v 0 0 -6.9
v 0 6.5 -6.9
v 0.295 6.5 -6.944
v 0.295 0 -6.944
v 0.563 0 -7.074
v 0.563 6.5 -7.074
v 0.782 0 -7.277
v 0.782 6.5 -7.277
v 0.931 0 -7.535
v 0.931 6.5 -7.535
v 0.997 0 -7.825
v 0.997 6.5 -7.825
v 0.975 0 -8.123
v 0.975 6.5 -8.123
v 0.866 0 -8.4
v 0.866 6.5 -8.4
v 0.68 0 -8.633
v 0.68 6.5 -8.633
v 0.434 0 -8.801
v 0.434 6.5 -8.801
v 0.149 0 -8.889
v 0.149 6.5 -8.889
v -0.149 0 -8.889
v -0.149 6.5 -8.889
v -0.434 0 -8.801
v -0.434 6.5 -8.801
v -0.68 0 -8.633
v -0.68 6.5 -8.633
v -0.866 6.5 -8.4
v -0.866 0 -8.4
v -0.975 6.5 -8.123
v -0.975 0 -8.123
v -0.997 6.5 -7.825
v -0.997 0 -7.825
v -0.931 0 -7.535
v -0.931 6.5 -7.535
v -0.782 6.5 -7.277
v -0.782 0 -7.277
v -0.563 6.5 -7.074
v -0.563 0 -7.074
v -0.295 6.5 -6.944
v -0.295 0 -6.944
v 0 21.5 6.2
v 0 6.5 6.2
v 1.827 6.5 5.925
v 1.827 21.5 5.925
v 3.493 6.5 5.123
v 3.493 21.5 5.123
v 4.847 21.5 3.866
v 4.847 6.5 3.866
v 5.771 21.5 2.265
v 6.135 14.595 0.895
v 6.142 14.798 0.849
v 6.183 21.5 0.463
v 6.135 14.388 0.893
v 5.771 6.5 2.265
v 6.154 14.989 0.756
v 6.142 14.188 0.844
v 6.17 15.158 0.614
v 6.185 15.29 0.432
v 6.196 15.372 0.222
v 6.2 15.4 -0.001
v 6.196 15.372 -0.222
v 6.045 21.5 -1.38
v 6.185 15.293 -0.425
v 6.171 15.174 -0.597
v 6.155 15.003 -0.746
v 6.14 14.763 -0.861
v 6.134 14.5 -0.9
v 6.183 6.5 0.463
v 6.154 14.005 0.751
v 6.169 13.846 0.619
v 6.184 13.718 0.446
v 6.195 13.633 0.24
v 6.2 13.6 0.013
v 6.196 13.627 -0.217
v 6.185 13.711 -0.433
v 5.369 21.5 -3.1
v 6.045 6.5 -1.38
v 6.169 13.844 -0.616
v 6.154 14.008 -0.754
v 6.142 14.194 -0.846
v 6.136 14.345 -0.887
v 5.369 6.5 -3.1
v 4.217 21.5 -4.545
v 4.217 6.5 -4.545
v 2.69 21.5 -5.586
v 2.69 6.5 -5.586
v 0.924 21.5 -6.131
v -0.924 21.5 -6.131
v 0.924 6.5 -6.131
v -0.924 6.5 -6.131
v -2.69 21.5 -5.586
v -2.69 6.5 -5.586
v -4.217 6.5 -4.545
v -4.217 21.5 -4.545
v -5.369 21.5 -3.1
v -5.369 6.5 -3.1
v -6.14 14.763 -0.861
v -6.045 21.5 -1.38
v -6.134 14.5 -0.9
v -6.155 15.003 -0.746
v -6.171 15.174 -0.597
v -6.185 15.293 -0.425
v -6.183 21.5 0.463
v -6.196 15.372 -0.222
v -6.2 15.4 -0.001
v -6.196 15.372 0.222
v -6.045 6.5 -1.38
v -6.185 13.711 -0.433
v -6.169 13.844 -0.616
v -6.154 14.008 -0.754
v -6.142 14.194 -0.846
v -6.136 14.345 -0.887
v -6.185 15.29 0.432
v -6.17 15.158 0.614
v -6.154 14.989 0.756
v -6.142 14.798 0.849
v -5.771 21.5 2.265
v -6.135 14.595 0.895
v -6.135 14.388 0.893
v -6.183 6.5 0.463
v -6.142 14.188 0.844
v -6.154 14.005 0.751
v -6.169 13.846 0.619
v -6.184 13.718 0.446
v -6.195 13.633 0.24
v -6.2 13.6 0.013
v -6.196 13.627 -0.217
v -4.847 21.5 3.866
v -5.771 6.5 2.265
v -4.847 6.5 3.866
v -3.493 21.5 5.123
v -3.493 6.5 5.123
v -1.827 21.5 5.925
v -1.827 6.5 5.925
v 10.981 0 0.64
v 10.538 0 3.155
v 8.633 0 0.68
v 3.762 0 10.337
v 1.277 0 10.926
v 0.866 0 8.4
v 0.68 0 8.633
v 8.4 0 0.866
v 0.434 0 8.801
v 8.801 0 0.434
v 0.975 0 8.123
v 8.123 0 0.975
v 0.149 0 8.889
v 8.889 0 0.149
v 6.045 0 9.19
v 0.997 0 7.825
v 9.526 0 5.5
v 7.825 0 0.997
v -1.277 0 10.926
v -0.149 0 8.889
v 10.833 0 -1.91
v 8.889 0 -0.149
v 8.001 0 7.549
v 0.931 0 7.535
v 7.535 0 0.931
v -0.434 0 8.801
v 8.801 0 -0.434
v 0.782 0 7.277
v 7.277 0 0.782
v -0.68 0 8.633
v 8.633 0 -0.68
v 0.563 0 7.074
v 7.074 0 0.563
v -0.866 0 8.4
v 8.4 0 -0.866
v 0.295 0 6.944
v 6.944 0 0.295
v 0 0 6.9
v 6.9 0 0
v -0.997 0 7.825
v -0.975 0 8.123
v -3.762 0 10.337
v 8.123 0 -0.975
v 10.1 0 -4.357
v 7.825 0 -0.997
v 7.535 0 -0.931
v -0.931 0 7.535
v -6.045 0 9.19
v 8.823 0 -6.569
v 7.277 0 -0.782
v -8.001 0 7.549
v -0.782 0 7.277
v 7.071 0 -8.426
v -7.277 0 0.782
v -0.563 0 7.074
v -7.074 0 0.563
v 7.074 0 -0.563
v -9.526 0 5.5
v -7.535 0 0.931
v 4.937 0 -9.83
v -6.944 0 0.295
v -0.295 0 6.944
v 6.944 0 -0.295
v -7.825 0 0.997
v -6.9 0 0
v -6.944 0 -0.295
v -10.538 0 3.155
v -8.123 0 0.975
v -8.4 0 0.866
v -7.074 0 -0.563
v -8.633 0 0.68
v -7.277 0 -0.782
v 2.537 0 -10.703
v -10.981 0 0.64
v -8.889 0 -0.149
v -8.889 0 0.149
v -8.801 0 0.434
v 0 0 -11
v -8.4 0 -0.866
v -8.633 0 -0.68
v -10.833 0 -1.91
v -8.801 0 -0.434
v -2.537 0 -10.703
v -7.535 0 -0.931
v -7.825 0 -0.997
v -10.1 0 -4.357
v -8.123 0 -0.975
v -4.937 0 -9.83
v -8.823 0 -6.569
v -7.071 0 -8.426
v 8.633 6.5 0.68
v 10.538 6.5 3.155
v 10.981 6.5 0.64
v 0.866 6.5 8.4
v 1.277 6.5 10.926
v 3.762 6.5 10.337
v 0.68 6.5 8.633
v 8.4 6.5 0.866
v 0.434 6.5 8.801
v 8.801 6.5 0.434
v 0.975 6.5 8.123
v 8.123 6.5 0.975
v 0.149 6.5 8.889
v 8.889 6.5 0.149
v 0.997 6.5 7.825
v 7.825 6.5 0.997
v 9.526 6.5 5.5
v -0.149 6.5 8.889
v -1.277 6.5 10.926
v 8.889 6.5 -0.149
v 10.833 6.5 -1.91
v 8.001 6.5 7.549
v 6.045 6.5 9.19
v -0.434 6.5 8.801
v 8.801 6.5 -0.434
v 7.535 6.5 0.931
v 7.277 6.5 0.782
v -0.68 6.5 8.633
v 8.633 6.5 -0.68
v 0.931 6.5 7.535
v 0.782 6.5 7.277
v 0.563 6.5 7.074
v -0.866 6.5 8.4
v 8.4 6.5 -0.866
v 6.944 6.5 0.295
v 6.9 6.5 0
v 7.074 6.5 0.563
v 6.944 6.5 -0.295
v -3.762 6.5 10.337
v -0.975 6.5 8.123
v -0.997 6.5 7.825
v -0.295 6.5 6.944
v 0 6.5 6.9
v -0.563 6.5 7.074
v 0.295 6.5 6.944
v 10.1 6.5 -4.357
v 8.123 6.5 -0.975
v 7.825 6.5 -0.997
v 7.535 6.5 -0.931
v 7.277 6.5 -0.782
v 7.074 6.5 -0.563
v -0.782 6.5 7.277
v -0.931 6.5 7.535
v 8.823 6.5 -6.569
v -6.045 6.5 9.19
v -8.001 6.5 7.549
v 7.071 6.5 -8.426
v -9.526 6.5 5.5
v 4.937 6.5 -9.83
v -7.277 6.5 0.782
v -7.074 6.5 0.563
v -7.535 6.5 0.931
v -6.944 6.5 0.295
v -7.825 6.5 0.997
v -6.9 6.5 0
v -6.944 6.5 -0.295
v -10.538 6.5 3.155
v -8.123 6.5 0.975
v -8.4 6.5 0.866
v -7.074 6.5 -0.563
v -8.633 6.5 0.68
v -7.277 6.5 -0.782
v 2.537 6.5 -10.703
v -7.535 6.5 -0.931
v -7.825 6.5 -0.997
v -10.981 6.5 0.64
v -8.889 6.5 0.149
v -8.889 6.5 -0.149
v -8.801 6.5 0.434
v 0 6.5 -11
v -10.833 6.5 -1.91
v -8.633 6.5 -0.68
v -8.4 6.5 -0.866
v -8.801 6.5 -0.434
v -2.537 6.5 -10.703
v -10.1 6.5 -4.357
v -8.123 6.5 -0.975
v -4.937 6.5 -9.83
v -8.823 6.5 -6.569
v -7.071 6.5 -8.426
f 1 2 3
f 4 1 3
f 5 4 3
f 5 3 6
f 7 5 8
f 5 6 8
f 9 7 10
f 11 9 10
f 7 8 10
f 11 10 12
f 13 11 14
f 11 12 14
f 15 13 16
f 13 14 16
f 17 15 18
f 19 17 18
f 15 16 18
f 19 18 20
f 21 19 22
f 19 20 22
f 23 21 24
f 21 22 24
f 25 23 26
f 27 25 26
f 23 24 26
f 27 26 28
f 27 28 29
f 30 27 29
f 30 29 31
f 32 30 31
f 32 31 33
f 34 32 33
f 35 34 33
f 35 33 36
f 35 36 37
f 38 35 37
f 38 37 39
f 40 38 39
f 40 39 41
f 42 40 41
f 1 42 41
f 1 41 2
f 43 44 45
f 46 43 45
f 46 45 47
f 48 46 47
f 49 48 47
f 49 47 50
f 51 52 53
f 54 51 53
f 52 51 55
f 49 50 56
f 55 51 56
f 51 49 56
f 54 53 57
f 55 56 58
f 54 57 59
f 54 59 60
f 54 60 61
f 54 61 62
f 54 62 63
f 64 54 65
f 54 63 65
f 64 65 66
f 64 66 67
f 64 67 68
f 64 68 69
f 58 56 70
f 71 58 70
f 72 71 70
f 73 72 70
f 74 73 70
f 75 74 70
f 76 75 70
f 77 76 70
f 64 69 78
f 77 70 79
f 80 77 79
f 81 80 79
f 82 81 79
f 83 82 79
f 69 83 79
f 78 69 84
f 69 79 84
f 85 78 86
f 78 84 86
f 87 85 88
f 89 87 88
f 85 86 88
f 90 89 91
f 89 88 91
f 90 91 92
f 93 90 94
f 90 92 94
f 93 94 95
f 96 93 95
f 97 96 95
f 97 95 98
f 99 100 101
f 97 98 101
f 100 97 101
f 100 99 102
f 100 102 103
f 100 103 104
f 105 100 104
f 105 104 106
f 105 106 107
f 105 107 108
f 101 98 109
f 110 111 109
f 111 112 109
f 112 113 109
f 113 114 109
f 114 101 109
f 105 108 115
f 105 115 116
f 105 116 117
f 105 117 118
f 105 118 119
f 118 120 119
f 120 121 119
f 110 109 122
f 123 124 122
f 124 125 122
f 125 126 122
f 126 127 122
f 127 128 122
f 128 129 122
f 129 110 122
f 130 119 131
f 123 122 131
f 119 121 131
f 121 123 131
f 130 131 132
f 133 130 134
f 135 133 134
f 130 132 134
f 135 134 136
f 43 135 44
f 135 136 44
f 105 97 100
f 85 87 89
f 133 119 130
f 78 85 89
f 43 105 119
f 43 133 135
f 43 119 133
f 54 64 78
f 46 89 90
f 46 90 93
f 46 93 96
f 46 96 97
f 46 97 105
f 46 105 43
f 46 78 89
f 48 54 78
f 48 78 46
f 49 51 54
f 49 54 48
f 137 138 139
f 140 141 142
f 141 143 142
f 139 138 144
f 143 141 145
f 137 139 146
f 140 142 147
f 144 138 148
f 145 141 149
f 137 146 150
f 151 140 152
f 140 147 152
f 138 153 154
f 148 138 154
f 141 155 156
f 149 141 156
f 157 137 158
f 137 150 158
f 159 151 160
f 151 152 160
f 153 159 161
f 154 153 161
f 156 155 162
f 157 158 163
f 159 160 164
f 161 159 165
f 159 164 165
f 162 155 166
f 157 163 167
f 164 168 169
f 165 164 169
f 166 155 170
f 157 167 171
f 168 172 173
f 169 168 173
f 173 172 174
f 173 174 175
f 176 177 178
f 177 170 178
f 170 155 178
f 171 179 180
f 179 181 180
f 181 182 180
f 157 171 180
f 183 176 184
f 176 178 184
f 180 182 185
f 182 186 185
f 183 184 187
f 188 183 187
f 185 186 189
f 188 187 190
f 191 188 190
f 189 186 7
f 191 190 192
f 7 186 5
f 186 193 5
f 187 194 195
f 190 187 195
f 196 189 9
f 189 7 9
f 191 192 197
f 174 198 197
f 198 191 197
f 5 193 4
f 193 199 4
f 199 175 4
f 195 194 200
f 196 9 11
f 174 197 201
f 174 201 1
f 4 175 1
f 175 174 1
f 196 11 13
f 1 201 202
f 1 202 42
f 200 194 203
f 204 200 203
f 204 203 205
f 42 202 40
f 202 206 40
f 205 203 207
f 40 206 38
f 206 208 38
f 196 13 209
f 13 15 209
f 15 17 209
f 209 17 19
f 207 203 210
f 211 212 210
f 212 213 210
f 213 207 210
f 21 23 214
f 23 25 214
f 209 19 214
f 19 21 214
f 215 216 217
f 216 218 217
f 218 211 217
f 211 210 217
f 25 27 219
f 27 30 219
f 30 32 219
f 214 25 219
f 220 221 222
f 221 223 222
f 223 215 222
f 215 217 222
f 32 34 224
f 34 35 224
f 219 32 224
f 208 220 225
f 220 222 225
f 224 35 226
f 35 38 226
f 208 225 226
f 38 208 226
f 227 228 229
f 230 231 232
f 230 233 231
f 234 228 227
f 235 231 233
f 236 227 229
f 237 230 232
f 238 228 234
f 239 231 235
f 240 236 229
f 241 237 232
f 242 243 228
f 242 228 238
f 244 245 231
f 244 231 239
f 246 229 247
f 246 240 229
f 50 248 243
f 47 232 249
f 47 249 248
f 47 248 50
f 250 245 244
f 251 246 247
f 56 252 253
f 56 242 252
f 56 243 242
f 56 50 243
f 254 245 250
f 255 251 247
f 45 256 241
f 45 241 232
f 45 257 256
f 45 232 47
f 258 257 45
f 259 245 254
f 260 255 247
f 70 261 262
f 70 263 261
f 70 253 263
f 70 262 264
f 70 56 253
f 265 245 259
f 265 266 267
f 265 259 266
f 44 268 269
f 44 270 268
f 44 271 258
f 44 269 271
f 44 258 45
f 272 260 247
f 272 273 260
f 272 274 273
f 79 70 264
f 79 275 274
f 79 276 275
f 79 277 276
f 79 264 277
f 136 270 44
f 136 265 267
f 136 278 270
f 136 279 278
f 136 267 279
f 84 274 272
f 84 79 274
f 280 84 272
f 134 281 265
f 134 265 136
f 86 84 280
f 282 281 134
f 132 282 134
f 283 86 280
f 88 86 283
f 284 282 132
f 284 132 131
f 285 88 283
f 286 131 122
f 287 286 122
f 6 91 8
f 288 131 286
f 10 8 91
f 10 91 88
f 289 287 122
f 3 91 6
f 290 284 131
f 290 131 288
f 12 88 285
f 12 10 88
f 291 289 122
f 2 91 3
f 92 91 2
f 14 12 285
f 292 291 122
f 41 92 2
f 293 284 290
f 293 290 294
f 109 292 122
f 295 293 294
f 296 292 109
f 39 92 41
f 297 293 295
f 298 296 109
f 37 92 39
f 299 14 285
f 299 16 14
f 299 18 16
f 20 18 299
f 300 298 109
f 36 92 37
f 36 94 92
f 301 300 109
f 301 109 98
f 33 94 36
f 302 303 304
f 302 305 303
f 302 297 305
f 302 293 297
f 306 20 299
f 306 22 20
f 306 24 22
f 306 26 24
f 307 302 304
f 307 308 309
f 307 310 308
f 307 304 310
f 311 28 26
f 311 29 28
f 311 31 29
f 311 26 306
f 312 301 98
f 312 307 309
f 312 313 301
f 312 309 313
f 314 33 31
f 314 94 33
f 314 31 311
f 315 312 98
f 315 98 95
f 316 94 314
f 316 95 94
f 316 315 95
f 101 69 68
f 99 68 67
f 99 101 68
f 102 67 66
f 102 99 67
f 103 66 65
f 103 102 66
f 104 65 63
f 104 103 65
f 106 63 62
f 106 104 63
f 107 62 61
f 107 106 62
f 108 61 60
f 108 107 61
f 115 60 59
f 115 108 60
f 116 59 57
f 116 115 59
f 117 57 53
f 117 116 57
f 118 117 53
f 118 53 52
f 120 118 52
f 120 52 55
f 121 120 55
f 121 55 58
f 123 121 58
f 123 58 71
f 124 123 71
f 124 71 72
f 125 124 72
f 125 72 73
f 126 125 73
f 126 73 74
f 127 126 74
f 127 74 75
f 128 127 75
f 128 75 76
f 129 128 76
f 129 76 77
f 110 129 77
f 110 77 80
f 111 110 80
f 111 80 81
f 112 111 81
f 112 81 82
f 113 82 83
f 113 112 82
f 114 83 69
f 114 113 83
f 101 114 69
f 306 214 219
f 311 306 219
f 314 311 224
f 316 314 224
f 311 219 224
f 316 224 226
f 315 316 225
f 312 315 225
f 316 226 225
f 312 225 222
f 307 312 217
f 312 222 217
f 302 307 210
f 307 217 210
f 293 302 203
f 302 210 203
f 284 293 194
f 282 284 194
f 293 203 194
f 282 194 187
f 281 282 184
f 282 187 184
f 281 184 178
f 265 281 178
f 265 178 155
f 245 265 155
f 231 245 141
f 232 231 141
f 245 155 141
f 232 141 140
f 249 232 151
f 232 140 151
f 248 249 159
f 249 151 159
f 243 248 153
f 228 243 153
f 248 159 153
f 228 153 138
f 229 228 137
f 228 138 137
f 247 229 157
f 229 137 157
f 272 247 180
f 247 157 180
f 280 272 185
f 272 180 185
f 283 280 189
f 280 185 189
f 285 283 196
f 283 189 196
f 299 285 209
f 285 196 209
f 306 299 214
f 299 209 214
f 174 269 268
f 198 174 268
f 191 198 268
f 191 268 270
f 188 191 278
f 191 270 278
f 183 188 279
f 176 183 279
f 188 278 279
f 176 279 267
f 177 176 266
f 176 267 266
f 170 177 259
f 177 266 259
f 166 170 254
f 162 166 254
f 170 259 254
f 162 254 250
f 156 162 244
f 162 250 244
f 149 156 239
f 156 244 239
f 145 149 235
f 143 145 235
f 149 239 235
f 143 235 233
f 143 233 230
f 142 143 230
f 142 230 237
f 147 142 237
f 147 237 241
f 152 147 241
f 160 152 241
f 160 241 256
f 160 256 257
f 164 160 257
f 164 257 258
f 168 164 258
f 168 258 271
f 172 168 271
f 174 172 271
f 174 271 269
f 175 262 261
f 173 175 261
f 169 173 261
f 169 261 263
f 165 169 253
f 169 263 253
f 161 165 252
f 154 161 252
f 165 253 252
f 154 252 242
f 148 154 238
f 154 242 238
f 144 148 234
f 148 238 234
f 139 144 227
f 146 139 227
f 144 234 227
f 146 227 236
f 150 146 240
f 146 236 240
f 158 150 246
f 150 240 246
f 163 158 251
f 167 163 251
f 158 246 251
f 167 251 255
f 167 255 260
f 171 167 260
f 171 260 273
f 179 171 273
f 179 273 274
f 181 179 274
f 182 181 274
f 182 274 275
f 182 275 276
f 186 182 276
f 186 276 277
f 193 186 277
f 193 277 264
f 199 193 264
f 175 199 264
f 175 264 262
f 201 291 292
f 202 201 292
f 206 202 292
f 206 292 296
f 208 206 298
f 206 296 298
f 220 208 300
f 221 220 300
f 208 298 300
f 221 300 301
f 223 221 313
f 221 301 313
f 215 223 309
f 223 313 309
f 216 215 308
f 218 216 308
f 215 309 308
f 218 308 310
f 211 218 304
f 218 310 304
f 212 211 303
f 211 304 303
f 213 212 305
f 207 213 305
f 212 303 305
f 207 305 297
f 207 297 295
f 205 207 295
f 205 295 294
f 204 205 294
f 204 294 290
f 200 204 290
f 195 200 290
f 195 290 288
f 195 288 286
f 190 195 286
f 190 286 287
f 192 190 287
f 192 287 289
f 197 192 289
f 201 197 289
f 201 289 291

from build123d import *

# Parameters (mm, degrees)
SKETCH1_R               = 11
BOSS_EXTRUDE1_DEPTH     = 6.5
SKETCH2_R               = 1
CUT_EXTRUDE1_DEPTH      = 17.8597153
CIRPATTERN1_COUNT       = 4
SKETCH3_R               = 6.2
BOSS_EXTRUDE2_DEPTH     = 15
CUT_EXTRUDE2_DEPTH      = 27.537709019
CUT_EXTRUDE2_DEPTH_BACK = 27.537709019
SKETCH4_R               = 0.9


with BuildPart() as part:
    # Sketch1 → Boss-Extrude1 (new body)
    with BuildSketch(Plane(origin=(0, 0, 0), x_dir=(1, 0, 0), z_dir=(0, 1, 0))):
        Circle(SKETCH1_R)
    extrude(amount=BOSS_EXTRUDE1_DEPTH)

    # Sketch2 → Cut-Extrude1 (cut, through all)
    with BuildSketch(Plane(origin=(0, 6.5, 0), x_dir=(1, 0, 0), z_dir=(0, 1, 0))):
        with Locations((0, 7.9)):
            Circle(SKETCH2_R)
    cut_extrude1 = extrude(amount=-CUT_EXTRUDE1_DEPTH, mode=Mode.SUBTRACT)

    # CirPattern1: Cut-Extrude1 ×4 about axis
    cirpattern1_axis = Axis((0, 6.5, 0), (0, -1, 0))
    for i in range(1, CIRPATTERN1_COUNT):
        add(cut_extrude1.rotate(cirpattern1_axis, i * 360 / CIRPATTERN1_COUNT), mode=Mode.SUBTRACT)

    # Sketch3 → Boss-Extrude2 (add)
    with BuildSketch(Plane(origin=(0, 6.5, 0), x_dir=(1, 0, 0), z_dir=(0, 1, 0))):
        Circle(SKETCH3_R)
    extrude(amount=BOSS_EXTRUDE2_DEPTH)

    # Sketch4 → Cut-Extrude2 (cut, two sides: drawn at the far end of the back side and taken through both)
    with BuildSketch(Plane(origin=(0, 0, 0), x_dir=(0, 0, -1), z_dir=(1, 0, 0)).offset(-CUT_EXTRUDE2_DEPTH_BACK)):
        with Locations((0, 14.5)):
            Circle(SKETCH4_R)
    extrude(amount=CUT_EXTRUDE2_DEPTH + CUT_EXTRUDE2_DEPTH_BACK, mode=Mode.SUBTRACT)


solid = part.part
